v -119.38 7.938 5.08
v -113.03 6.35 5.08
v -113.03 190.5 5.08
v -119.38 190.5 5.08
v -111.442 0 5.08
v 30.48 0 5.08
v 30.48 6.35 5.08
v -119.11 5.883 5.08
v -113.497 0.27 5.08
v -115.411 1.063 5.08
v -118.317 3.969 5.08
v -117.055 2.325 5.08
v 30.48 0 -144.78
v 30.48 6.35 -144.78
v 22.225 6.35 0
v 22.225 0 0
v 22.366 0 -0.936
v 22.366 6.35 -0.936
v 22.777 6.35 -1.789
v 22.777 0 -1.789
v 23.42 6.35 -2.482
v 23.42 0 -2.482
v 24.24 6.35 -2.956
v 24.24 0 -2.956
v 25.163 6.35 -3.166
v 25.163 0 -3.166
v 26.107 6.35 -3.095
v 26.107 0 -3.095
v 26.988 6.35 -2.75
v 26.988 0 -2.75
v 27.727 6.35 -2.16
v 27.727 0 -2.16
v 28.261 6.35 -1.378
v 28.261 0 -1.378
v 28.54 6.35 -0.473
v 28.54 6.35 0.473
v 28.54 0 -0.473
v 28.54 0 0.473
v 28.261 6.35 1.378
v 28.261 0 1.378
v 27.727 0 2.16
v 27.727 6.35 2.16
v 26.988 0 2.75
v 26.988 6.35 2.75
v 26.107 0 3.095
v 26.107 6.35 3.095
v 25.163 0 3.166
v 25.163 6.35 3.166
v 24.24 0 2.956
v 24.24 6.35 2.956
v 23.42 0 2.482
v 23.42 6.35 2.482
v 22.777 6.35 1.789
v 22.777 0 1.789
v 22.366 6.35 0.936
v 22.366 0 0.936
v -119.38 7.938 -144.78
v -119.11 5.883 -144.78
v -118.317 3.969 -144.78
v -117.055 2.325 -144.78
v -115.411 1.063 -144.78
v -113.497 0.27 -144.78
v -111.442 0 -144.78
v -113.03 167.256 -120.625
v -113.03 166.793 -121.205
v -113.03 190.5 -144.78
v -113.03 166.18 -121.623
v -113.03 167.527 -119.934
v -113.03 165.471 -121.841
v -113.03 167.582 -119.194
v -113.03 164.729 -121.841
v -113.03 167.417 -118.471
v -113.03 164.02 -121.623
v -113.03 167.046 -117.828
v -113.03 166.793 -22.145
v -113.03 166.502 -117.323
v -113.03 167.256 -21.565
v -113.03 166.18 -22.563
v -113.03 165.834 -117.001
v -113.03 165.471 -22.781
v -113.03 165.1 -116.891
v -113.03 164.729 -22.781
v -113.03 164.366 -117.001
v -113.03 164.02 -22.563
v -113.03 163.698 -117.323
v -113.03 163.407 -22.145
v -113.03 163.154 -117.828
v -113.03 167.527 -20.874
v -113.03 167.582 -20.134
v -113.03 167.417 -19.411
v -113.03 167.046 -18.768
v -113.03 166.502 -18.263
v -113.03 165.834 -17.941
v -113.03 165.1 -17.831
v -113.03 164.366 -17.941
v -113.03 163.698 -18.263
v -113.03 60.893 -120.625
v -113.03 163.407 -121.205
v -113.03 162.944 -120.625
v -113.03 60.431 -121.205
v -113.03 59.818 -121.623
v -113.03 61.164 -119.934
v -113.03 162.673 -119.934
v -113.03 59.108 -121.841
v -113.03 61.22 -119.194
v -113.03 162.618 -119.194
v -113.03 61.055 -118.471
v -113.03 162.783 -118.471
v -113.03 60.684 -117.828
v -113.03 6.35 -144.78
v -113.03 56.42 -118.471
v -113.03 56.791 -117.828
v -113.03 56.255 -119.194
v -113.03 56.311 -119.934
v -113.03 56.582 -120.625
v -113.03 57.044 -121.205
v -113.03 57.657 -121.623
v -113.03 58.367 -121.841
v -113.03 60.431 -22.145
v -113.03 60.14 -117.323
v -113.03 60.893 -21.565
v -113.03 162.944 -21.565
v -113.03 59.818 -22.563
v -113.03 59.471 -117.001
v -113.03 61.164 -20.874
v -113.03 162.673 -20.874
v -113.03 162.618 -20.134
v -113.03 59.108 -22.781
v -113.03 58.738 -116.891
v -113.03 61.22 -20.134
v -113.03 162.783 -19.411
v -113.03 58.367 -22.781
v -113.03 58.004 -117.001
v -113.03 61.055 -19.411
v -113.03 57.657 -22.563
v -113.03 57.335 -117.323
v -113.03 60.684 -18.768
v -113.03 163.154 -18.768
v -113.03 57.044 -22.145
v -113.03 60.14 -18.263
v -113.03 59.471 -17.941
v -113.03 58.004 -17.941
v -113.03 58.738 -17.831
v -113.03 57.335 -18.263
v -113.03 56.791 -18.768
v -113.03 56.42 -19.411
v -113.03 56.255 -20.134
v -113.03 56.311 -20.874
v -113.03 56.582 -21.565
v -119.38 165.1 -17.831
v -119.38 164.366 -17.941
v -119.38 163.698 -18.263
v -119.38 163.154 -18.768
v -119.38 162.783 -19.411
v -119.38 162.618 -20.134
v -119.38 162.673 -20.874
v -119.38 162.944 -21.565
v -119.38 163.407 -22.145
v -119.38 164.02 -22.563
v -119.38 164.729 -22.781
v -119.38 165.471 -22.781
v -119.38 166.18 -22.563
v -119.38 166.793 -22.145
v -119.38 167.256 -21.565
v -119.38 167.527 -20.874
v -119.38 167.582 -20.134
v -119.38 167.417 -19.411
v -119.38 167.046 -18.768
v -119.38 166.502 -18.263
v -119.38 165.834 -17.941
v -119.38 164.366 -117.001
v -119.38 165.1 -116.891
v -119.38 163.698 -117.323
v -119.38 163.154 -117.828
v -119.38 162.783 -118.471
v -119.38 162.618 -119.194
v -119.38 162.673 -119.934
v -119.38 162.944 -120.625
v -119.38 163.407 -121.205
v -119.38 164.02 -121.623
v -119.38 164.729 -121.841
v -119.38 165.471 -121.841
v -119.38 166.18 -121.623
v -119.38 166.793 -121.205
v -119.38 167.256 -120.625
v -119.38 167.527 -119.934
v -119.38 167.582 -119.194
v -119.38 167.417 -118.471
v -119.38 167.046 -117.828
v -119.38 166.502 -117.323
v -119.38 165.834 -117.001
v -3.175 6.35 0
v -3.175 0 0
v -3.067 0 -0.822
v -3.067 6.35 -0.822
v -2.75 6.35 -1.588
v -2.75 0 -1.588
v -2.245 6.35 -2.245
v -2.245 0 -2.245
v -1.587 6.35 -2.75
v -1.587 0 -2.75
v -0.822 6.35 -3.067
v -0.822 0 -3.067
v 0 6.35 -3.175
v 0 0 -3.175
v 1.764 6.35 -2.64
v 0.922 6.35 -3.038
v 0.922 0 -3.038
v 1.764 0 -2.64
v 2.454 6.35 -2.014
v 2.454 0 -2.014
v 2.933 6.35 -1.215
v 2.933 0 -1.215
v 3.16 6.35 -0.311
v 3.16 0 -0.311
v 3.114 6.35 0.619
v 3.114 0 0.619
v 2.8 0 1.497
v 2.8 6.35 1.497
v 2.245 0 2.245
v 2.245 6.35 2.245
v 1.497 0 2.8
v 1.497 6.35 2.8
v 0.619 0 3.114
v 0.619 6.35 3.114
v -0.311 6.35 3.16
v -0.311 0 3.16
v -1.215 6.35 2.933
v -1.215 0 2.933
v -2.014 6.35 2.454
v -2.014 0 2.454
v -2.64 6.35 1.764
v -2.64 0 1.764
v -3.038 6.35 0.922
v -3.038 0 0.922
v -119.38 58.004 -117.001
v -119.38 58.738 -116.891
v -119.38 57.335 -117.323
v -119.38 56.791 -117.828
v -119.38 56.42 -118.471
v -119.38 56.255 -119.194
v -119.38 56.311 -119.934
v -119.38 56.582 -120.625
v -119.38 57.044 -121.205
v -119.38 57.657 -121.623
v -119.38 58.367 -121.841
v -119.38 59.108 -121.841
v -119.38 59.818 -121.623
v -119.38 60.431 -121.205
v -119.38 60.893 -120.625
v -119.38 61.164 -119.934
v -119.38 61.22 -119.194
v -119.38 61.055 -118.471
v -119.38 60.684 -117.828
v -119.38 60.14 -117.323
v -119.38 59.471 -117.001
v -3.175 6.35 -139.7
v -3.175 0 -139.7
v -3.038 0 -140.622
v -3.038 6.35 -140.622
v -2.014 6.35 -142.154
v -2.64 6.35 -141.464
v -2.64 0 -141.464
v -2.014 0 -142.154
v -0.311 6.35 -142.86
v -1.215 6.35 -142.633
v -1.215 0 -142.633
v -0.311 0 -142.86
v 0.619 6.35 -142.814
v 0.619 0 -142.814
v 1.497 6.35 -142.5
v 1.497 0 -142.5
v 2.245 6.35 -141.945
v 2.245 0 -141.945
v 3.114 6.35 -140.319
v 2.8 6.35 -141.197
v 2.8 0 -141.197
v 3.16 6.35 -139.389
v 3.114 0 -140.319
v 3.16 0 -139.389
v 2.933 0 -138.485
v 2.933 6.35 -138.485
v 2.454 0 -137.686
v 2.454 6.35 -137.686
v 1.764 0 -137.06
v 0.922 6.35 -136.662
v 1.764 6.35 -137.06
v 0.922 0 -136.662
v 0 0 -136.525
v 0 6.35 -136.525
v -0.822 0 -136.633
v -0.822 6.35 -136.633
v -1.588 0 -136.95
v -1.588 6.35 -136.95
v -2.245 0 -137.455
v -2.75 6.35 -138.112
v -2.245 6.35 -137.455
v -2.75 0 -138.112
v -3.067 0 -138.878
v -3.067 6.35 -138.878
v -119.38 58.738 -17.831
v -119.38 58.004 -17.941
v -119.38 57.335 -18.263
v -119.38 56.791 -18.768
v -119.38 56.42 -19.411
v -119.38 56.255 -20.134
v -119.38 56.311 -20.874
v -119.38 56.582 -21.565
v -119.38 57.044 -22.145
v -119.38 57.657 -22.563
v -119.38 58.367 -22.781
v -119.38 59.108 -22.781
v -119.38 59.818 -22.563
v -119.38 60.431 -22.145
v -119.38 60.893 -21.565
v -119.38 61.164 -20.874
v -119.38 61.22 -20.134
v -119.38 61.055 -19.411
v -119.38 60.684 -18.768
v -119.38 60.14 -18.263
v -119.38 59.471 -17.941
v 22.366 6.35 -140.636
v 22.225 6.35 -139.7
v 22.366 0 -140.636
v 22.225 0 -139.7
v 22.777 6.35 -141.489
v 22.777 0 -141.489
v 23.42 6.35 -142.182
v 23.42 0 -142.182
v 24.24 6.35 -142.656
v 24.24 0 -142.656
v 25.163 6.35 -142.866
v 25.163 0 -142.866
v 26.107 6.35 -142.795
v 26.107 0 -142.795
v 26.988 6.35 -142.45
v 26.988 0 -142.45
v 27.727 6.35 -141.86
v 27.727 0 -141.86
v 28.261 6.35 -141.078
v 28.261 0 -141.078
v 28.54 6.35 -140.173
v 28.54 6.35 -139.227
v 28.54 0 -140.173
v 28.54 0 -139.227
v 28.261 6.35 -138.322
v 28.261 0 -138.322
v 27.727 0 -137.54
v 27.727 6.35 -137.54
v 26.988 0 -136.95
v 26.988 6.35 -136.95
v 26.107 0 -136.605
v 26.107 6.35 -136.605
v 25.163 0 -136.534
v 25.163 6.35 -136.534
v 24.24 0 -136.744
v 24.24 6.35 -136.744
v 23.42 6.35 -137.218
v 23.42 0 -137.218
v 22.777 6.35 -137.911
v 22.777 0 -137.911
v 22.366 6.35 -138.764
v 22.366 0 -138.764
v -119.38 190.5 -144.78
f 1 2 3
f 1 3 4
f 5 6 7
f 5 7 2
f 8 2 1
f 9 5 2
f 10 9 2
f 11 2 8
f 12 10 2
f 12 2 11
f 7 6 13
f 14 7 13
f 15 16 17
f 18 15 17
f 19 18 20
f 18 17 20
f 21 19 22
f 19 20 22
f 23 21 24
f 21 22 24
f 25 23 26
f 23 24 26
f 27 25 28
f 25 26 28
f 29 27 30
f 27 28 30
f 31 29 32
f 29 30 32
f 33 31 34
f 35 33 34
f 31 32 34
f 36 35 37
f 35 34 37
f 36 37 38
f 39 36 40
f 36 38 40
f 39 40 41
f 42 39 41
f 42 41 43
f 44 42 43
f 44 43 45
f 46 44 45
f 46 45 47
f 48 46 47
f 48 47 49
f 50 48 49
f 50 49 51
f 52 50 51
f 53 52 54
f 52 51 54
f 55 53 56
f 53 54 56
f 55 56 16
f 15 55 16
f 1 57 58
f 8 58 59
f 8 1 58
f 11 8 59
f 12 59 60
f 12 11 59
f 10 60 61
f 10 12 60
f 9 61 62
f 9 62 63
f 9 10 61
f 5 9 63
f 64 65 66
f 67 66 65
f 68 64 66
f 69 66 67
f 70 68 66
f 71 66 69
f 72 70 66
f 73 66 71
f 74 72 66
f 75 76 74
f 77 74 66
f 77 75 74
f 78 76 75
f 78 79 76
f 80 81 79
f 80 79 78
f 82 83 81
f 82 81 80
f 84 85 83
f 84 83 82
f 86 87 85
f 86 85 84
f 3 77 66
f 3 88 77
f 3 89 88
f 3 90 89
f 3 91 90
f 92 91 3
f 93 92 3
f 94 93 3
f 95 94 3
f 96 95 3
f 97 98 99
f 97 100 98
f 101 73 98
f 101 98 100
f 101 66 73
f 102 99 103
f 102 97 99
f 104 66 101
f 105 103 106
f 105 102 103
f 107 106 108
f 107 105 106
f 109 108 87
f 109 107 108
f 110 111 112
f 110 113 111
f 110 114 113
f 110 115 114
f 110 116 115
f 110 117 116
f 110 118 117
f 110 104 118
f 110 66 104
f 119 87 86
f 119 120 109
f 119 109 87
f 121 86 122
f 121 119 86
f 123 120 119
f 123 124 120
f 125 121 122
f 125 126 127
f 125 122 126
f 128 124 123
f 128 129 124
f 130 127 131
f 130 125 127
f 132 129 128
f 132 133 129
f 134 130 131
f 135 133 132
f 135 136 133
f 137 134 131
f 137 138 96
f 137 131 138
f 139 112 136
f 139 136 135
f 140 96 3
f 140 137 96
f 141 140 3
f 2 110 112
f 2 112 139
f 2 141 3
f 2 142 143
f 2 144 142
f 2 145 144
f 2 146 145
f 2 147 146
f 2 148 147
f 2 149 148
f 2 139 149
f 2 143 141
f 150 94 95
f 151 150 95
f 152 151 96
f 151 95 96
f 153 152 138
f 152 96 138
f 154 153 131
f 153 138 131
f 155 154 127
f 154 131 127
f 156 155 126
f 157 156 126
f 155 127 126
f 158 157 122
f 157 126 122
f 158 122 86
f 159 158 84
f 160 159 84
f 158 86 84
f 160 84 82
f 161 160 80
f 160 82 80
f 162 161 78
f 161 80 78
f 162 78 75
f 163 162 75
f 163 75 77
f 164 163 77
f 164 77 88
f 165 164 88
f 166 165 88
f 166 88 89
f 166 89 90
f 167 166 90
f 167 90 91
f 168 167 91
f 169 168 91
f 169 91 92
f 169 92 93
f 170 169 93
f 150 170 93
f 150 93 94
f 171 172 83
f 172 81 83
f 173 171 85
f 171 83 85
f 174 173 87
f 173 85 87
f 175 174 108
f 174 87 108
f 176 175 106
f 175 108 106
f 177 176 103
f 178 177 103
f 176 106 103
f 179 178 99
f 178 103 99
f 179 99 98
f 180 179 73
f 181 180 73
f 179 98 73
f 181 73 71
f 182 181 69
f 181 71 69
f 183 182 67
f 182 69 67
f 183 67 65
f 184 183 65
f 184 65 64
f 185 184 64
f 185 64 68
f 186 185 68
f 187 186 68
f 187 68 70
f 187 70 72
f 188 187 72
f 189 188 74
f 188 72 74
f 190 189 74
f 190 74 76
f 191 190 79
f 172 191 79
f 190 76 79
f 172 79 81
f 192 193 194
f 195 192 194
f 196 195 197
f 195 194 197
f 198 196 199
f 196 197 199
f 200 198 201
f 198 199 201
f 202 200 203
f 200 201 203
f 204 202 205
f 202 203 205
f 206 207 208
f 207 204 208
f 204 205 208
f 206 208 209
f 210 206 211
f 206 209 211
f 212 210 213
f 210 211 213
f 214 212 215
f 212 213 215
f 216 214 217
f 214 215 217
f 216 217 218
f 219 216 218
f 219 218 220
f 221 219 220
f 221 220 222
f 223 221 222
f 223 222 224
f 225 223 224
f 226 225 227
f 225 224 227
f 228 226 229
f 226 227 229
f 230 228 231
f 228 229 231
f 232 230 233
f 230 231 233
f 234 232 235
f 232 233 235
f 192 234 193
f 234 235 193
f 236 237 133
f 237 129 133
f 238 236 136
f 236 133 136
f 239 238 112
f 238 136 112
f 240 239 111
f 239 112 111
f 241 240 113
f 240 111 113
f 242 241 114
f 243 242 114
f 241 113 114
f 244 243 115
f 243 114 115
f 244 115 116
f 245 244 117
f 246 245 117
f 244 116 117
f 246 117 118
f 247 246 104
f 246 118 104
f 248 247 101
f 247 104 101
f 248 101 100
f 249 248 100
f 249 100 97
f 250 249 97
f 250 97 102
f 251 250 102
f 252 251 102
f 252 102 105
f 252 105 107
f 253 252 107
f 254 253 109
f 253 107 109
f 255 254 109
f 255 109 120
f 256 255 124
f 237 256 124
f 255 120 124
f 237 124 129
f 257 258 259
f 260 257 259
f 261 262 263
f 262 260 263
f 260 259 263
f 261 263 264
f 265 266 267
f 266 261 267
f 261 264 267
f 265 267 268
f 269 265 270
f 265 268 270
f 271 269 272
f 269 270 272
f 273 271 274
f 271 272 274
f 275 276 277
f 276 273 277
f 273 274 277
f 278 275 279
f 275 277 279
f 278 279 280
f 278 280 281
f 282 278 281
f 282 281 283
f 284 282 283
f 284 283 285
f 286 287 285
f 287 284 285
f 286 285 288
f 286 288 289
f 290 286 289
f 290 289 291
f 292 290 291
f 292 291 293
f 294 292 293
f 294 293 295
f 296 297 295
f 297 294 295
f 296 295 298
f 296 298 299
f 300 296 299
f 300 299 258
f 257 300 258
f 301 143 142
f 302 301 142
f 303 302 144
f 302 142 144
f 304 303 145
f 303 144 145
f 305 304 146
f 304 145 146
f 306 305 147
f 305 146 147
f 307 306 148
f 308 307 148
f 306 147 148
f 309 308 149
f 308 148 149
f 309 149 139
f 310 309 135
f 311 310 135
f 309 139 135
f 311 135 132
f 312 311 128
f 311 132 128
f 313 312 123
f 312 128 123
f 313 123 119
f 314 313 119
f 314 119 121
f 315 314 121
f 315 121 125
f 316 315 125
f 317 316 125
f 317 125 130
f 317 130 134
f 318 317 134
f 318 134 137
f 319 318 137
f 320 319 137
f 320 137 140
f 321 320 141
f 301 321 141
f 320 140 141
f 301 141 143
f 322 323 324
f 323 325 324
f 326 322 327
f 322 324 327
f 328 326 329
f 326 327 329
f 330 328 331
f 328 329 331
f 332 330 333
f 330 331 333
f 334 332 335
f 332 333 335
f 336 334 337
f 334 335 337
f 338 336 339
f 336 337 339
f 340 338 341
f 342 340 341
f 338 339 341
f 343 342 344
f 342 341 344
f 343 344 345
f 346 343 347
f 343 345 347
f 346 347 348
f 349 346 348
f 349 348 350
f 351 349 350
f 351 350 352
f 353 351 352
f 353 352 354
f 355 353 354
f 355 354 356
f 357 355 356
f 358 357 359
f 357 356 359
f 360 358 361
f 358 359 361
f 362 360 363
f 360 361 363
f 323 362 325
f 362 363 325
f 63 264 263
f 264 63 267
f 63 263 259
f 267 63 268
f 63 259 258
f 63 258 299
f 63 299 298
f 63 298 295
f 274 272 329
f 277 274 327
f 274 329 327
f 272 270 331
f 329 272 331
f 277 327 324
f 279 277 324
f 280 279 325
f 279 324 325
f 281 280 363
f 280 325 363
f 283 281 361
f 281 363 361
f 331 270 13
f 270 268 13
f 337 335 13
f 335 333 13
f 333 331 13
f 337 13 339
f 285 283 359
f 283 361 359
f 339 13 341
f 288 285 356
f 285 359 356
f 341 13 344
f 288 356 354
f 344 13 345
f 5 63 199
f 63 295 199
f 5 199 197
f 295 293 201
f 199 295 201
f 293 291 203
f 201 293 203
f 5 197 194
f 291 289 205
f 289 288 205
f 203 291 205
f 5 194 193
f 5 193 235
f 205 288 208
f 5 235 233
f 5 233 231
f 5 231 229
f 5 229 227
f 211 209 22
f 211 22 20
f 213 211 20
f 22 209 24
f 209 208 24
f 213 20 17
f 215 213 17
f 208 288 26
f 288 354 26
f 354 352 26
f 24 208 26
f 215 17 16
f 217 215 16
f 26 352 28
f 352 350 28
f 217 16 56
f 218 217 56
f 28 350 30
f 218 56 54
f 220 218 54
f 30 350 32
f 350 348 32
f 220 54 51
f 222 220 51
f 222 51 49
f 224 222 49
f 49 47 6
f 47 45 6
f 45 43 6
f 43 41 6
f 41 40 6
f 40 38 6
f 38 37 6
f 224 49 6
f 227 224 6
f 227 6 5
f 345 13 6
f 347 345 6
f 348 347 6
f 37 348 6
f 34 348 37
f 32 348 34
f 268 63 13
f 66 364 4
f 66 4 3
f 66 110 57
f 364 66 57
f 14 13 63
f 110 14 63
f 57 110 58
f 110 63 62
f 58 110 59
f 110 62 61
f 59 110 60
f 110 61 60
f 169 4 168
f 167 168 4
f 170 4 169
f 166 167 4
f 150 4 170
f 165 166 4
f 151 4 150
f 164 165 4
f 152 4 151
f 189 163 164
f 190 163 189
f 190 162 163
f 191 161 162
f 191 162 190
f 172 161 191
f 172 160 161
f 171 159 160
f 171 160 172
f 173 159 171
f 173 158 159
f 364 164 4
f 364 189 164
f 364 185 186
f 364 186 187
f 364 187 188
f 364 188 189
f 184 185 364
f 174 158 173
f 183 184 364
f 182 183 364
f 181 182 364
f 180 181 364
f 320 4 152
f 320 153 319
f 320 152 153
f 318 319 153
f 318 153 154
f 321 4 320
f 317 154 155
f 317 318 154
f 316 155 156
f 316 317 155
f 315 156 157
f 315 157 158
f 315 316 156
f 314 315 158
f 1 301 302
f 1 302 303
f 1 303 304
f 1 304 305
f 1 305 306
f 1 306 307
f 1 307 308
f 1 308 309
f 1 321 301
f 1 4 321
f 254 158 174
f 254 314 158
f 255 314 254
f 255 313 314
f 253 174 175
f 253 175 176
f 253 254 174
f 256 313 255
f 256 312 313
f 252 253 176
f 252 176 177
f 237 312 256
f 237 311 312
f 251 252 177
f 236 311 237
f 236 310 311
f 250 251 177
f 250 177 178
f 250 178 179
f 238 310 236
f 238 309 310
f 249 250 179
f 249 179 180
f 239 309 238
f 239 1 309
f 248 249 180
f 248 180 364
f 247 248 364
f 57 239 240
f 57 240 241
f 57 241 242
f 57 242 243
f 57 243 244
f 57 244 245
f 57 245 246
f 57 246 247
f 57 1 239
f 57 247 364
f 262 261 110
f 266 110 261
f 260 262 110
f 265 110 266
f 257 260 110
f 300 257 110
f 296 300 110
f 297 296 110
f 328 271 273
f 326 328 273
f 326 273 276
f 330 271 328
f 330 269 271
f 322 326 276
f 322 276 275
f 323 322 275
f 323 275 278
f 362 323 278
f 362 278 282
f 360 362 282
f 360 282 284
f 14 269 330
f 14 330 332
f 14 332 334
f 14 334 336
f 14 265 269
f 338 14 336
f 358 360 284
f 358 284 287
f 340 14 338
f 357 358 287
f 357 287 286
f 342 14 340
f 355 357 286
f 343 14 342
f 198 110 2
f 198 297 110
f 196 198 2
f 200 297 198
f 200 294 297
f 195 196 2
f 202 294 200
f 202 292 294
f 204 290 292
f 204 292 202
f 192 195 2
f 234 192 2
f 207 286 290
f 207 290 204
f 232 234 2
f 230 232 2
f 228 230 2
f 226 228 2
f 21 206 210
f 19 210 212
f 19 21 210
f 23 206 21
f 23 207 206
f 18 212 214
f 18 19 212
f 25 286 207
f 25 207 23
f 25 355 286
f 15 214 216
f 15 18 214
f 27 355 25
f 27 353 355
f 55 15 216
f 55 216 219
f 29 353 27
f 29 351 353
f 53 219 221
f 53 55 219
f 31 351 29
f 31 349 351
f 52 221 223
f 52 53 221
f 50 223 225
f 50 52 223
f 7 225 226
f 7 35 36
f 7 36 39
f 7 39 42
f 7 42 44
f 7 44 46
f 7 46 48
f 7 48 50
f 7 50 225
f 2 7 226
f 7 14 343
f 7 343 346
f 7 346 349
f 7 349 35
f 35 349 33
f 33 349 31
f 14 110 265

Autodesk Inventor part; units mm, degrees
ref_plane "YZ Plane" through (0, 0, 0) normal (1, 0, 0) x (0, 1, 0)
ref_plane "XZ Plane" through (0, 0, 0) normal (0, 1, 0) x (-1, 0, 0)
ref_plane "XY Plane" through (0, 0, 0) normal (0, 0, 1) x (1, 0, 0)
sketch "Sketch1" plane through (0, 0, 0) normal (0, 1, 0) x (-1, 0, 0)
  circle A0 centre (0, 0) radius 3.175
  line L0 (0, 0) -> (0, -139.7)
  circle A1 centre (0, -139.7) radius 3.175
  line L1 (0, 0) -> (-25.4, 0)
  circle A2 centre (-25.4, 0) radius 3.175
  line L2 (-25.4, 0) -> (-25.4, -139.7)
  circle A3 centre (-25.4, -139.7) radius 3.175
  line L3 (0, 0) -> (0, 5.08)
  line L4 (0, 5.08) -> (5.08, 5.08)
  line L5 (-25.4, -139.7) -> (-25.4, -144.78)
  line L6 (-25.4, -144.78) -> (-30.48, -144.78)
  line L7 (5.08, 5.08) -> (-30.48, 5.08)
  line L8 (-30.48, 5.08) -> (-30.48, -144.78)
  line L9 (-30.48, -144.78) -> (5.08, -144.78)
  line L10 (5.08, -144.78) -> (5.08, 5.08)
  dimension "d0" = 6.35
  dimension "d1" = 139.7
  dimension "d2" = 6.35
  dimension "d3" = 25.4
  dimension "d4" = 6.35
  dimension "d5" = 139.7
  dimension "d6" = 6.35
  dimension "d7" = 5.08
  dimension "d8" = 5.08
  dimension "d9" = 5.08
  dimension "d10" = 5.08
extrude "Extrusion1" add sketch "Sketch1" along normal blind 6.35 contours A0 L3 L4 L10 L9 L5 A3 L2 A2 L1 | A0 L1 A2 L2 A3 L5 L6 L8 L7 L3
sketch "Sketch3" plane through (-5.08, 0, -144.78) normal (-1, 0, 0) x (0, 0, 1)
  line L0 (0, 6.35) -> (149.86, 6.35) projected
  line L1 (0, 0) -> (149.86, 0) projected
  line L2 (0, 6.35) -> (149.86, 6.35)
  line L3 (149.86, 6.35) -> (149.86, 0)
  line L4 (149.86, 0) -> (0, 0)
  line L5 (0, 0) -> (0, 6.35)
  point P0 (144.78, 0)
extrude "Extrusion3" add sketch "Sketch3" along normal blind 114.3
sketch "Sketch4" plane through (0, 6.35, 0) normal (0, 1, 0) x (1, 0, 0)
  line L0 (30.48, 144.78) -> (-119.38, 144.78) projected
  line L1 (30.48, -5.08) -> (-119.38, -5.08) projected
  line L2 (-119.38, 144.78) -> (-113.03, 144.78)
  line L3 (-113.03, 144.78) -> (-113.03, -5.08)
  line L4 (-113.03, -5.08) -> (-119.38, -5.08)
  line L5 (-119.38, -5.08) -> (-119.38, 144.78)
  point P0 (0, 0)
  point P1 (-119.38, -5.08)
  dimension "d19" = 6.35
extrude "Extrusion4" add sketch "Sketch4" along normal blind 184.15
fillet "Fillet1" radius 7.9375 1 edges at (-119.38, 0, -69.85)
sketch "Sketch5" plane through (-119.38, 0, -144.78) normal (-1, 0, 0) x (0, 0, 1)
  line L0 (149.86, 190.5) -> (0, 190.5) projected
  line L1 (0, 190.5) -> (25.4, 190.5)
  line L2 (25.4, 190.5) -> (25.4, 165.1)
  line L3 (149.86, 190.5) -> (124.46, 190.5)
  line L4 (124.46, 190.5) -> (124.46, 165.1)
  line L5 (0, 7.9375) -> (25.4, 7.9375)
  line L6 (149.86, 7.9375) -> (0, 7.9375) projected
  line L7 (25.4, 7.9375) -> (25.4, 58.7375)
  line L8 (149.86, 7.9375) -> (124.46, 7.9375)
  line L9 (124.46, 7.9375) -> (124.46, 58.7375)
  point P0 (144.78, 0)
  dimension "d23" = 25.4
  dimension "d24" = 25.4
  dimension "d25" = 25.4
  dimension "d26" = 25.4
  dimension "d27" = 25.4
  dimension "d29" = 50.8
  dimension "d30" = 25.4
  dimension "d31" = 50.8
  dimension "d32" = 90
hole "Hole1" at (-119.38, 165.1, -119.38) at (-119.38, 165.1, -20.32) at (-119.38, 58.7375, -119.38) at (-119.38, 58.7375, -20.32) direction (1, 0, 0) diameter 4.9784 depth 19.05 tip angle 118 thread size "1/4-20 UNC" class "2B" standard "ANSI Unified Screw Threads"
properties part number "ConnectionBarcket(H)"
